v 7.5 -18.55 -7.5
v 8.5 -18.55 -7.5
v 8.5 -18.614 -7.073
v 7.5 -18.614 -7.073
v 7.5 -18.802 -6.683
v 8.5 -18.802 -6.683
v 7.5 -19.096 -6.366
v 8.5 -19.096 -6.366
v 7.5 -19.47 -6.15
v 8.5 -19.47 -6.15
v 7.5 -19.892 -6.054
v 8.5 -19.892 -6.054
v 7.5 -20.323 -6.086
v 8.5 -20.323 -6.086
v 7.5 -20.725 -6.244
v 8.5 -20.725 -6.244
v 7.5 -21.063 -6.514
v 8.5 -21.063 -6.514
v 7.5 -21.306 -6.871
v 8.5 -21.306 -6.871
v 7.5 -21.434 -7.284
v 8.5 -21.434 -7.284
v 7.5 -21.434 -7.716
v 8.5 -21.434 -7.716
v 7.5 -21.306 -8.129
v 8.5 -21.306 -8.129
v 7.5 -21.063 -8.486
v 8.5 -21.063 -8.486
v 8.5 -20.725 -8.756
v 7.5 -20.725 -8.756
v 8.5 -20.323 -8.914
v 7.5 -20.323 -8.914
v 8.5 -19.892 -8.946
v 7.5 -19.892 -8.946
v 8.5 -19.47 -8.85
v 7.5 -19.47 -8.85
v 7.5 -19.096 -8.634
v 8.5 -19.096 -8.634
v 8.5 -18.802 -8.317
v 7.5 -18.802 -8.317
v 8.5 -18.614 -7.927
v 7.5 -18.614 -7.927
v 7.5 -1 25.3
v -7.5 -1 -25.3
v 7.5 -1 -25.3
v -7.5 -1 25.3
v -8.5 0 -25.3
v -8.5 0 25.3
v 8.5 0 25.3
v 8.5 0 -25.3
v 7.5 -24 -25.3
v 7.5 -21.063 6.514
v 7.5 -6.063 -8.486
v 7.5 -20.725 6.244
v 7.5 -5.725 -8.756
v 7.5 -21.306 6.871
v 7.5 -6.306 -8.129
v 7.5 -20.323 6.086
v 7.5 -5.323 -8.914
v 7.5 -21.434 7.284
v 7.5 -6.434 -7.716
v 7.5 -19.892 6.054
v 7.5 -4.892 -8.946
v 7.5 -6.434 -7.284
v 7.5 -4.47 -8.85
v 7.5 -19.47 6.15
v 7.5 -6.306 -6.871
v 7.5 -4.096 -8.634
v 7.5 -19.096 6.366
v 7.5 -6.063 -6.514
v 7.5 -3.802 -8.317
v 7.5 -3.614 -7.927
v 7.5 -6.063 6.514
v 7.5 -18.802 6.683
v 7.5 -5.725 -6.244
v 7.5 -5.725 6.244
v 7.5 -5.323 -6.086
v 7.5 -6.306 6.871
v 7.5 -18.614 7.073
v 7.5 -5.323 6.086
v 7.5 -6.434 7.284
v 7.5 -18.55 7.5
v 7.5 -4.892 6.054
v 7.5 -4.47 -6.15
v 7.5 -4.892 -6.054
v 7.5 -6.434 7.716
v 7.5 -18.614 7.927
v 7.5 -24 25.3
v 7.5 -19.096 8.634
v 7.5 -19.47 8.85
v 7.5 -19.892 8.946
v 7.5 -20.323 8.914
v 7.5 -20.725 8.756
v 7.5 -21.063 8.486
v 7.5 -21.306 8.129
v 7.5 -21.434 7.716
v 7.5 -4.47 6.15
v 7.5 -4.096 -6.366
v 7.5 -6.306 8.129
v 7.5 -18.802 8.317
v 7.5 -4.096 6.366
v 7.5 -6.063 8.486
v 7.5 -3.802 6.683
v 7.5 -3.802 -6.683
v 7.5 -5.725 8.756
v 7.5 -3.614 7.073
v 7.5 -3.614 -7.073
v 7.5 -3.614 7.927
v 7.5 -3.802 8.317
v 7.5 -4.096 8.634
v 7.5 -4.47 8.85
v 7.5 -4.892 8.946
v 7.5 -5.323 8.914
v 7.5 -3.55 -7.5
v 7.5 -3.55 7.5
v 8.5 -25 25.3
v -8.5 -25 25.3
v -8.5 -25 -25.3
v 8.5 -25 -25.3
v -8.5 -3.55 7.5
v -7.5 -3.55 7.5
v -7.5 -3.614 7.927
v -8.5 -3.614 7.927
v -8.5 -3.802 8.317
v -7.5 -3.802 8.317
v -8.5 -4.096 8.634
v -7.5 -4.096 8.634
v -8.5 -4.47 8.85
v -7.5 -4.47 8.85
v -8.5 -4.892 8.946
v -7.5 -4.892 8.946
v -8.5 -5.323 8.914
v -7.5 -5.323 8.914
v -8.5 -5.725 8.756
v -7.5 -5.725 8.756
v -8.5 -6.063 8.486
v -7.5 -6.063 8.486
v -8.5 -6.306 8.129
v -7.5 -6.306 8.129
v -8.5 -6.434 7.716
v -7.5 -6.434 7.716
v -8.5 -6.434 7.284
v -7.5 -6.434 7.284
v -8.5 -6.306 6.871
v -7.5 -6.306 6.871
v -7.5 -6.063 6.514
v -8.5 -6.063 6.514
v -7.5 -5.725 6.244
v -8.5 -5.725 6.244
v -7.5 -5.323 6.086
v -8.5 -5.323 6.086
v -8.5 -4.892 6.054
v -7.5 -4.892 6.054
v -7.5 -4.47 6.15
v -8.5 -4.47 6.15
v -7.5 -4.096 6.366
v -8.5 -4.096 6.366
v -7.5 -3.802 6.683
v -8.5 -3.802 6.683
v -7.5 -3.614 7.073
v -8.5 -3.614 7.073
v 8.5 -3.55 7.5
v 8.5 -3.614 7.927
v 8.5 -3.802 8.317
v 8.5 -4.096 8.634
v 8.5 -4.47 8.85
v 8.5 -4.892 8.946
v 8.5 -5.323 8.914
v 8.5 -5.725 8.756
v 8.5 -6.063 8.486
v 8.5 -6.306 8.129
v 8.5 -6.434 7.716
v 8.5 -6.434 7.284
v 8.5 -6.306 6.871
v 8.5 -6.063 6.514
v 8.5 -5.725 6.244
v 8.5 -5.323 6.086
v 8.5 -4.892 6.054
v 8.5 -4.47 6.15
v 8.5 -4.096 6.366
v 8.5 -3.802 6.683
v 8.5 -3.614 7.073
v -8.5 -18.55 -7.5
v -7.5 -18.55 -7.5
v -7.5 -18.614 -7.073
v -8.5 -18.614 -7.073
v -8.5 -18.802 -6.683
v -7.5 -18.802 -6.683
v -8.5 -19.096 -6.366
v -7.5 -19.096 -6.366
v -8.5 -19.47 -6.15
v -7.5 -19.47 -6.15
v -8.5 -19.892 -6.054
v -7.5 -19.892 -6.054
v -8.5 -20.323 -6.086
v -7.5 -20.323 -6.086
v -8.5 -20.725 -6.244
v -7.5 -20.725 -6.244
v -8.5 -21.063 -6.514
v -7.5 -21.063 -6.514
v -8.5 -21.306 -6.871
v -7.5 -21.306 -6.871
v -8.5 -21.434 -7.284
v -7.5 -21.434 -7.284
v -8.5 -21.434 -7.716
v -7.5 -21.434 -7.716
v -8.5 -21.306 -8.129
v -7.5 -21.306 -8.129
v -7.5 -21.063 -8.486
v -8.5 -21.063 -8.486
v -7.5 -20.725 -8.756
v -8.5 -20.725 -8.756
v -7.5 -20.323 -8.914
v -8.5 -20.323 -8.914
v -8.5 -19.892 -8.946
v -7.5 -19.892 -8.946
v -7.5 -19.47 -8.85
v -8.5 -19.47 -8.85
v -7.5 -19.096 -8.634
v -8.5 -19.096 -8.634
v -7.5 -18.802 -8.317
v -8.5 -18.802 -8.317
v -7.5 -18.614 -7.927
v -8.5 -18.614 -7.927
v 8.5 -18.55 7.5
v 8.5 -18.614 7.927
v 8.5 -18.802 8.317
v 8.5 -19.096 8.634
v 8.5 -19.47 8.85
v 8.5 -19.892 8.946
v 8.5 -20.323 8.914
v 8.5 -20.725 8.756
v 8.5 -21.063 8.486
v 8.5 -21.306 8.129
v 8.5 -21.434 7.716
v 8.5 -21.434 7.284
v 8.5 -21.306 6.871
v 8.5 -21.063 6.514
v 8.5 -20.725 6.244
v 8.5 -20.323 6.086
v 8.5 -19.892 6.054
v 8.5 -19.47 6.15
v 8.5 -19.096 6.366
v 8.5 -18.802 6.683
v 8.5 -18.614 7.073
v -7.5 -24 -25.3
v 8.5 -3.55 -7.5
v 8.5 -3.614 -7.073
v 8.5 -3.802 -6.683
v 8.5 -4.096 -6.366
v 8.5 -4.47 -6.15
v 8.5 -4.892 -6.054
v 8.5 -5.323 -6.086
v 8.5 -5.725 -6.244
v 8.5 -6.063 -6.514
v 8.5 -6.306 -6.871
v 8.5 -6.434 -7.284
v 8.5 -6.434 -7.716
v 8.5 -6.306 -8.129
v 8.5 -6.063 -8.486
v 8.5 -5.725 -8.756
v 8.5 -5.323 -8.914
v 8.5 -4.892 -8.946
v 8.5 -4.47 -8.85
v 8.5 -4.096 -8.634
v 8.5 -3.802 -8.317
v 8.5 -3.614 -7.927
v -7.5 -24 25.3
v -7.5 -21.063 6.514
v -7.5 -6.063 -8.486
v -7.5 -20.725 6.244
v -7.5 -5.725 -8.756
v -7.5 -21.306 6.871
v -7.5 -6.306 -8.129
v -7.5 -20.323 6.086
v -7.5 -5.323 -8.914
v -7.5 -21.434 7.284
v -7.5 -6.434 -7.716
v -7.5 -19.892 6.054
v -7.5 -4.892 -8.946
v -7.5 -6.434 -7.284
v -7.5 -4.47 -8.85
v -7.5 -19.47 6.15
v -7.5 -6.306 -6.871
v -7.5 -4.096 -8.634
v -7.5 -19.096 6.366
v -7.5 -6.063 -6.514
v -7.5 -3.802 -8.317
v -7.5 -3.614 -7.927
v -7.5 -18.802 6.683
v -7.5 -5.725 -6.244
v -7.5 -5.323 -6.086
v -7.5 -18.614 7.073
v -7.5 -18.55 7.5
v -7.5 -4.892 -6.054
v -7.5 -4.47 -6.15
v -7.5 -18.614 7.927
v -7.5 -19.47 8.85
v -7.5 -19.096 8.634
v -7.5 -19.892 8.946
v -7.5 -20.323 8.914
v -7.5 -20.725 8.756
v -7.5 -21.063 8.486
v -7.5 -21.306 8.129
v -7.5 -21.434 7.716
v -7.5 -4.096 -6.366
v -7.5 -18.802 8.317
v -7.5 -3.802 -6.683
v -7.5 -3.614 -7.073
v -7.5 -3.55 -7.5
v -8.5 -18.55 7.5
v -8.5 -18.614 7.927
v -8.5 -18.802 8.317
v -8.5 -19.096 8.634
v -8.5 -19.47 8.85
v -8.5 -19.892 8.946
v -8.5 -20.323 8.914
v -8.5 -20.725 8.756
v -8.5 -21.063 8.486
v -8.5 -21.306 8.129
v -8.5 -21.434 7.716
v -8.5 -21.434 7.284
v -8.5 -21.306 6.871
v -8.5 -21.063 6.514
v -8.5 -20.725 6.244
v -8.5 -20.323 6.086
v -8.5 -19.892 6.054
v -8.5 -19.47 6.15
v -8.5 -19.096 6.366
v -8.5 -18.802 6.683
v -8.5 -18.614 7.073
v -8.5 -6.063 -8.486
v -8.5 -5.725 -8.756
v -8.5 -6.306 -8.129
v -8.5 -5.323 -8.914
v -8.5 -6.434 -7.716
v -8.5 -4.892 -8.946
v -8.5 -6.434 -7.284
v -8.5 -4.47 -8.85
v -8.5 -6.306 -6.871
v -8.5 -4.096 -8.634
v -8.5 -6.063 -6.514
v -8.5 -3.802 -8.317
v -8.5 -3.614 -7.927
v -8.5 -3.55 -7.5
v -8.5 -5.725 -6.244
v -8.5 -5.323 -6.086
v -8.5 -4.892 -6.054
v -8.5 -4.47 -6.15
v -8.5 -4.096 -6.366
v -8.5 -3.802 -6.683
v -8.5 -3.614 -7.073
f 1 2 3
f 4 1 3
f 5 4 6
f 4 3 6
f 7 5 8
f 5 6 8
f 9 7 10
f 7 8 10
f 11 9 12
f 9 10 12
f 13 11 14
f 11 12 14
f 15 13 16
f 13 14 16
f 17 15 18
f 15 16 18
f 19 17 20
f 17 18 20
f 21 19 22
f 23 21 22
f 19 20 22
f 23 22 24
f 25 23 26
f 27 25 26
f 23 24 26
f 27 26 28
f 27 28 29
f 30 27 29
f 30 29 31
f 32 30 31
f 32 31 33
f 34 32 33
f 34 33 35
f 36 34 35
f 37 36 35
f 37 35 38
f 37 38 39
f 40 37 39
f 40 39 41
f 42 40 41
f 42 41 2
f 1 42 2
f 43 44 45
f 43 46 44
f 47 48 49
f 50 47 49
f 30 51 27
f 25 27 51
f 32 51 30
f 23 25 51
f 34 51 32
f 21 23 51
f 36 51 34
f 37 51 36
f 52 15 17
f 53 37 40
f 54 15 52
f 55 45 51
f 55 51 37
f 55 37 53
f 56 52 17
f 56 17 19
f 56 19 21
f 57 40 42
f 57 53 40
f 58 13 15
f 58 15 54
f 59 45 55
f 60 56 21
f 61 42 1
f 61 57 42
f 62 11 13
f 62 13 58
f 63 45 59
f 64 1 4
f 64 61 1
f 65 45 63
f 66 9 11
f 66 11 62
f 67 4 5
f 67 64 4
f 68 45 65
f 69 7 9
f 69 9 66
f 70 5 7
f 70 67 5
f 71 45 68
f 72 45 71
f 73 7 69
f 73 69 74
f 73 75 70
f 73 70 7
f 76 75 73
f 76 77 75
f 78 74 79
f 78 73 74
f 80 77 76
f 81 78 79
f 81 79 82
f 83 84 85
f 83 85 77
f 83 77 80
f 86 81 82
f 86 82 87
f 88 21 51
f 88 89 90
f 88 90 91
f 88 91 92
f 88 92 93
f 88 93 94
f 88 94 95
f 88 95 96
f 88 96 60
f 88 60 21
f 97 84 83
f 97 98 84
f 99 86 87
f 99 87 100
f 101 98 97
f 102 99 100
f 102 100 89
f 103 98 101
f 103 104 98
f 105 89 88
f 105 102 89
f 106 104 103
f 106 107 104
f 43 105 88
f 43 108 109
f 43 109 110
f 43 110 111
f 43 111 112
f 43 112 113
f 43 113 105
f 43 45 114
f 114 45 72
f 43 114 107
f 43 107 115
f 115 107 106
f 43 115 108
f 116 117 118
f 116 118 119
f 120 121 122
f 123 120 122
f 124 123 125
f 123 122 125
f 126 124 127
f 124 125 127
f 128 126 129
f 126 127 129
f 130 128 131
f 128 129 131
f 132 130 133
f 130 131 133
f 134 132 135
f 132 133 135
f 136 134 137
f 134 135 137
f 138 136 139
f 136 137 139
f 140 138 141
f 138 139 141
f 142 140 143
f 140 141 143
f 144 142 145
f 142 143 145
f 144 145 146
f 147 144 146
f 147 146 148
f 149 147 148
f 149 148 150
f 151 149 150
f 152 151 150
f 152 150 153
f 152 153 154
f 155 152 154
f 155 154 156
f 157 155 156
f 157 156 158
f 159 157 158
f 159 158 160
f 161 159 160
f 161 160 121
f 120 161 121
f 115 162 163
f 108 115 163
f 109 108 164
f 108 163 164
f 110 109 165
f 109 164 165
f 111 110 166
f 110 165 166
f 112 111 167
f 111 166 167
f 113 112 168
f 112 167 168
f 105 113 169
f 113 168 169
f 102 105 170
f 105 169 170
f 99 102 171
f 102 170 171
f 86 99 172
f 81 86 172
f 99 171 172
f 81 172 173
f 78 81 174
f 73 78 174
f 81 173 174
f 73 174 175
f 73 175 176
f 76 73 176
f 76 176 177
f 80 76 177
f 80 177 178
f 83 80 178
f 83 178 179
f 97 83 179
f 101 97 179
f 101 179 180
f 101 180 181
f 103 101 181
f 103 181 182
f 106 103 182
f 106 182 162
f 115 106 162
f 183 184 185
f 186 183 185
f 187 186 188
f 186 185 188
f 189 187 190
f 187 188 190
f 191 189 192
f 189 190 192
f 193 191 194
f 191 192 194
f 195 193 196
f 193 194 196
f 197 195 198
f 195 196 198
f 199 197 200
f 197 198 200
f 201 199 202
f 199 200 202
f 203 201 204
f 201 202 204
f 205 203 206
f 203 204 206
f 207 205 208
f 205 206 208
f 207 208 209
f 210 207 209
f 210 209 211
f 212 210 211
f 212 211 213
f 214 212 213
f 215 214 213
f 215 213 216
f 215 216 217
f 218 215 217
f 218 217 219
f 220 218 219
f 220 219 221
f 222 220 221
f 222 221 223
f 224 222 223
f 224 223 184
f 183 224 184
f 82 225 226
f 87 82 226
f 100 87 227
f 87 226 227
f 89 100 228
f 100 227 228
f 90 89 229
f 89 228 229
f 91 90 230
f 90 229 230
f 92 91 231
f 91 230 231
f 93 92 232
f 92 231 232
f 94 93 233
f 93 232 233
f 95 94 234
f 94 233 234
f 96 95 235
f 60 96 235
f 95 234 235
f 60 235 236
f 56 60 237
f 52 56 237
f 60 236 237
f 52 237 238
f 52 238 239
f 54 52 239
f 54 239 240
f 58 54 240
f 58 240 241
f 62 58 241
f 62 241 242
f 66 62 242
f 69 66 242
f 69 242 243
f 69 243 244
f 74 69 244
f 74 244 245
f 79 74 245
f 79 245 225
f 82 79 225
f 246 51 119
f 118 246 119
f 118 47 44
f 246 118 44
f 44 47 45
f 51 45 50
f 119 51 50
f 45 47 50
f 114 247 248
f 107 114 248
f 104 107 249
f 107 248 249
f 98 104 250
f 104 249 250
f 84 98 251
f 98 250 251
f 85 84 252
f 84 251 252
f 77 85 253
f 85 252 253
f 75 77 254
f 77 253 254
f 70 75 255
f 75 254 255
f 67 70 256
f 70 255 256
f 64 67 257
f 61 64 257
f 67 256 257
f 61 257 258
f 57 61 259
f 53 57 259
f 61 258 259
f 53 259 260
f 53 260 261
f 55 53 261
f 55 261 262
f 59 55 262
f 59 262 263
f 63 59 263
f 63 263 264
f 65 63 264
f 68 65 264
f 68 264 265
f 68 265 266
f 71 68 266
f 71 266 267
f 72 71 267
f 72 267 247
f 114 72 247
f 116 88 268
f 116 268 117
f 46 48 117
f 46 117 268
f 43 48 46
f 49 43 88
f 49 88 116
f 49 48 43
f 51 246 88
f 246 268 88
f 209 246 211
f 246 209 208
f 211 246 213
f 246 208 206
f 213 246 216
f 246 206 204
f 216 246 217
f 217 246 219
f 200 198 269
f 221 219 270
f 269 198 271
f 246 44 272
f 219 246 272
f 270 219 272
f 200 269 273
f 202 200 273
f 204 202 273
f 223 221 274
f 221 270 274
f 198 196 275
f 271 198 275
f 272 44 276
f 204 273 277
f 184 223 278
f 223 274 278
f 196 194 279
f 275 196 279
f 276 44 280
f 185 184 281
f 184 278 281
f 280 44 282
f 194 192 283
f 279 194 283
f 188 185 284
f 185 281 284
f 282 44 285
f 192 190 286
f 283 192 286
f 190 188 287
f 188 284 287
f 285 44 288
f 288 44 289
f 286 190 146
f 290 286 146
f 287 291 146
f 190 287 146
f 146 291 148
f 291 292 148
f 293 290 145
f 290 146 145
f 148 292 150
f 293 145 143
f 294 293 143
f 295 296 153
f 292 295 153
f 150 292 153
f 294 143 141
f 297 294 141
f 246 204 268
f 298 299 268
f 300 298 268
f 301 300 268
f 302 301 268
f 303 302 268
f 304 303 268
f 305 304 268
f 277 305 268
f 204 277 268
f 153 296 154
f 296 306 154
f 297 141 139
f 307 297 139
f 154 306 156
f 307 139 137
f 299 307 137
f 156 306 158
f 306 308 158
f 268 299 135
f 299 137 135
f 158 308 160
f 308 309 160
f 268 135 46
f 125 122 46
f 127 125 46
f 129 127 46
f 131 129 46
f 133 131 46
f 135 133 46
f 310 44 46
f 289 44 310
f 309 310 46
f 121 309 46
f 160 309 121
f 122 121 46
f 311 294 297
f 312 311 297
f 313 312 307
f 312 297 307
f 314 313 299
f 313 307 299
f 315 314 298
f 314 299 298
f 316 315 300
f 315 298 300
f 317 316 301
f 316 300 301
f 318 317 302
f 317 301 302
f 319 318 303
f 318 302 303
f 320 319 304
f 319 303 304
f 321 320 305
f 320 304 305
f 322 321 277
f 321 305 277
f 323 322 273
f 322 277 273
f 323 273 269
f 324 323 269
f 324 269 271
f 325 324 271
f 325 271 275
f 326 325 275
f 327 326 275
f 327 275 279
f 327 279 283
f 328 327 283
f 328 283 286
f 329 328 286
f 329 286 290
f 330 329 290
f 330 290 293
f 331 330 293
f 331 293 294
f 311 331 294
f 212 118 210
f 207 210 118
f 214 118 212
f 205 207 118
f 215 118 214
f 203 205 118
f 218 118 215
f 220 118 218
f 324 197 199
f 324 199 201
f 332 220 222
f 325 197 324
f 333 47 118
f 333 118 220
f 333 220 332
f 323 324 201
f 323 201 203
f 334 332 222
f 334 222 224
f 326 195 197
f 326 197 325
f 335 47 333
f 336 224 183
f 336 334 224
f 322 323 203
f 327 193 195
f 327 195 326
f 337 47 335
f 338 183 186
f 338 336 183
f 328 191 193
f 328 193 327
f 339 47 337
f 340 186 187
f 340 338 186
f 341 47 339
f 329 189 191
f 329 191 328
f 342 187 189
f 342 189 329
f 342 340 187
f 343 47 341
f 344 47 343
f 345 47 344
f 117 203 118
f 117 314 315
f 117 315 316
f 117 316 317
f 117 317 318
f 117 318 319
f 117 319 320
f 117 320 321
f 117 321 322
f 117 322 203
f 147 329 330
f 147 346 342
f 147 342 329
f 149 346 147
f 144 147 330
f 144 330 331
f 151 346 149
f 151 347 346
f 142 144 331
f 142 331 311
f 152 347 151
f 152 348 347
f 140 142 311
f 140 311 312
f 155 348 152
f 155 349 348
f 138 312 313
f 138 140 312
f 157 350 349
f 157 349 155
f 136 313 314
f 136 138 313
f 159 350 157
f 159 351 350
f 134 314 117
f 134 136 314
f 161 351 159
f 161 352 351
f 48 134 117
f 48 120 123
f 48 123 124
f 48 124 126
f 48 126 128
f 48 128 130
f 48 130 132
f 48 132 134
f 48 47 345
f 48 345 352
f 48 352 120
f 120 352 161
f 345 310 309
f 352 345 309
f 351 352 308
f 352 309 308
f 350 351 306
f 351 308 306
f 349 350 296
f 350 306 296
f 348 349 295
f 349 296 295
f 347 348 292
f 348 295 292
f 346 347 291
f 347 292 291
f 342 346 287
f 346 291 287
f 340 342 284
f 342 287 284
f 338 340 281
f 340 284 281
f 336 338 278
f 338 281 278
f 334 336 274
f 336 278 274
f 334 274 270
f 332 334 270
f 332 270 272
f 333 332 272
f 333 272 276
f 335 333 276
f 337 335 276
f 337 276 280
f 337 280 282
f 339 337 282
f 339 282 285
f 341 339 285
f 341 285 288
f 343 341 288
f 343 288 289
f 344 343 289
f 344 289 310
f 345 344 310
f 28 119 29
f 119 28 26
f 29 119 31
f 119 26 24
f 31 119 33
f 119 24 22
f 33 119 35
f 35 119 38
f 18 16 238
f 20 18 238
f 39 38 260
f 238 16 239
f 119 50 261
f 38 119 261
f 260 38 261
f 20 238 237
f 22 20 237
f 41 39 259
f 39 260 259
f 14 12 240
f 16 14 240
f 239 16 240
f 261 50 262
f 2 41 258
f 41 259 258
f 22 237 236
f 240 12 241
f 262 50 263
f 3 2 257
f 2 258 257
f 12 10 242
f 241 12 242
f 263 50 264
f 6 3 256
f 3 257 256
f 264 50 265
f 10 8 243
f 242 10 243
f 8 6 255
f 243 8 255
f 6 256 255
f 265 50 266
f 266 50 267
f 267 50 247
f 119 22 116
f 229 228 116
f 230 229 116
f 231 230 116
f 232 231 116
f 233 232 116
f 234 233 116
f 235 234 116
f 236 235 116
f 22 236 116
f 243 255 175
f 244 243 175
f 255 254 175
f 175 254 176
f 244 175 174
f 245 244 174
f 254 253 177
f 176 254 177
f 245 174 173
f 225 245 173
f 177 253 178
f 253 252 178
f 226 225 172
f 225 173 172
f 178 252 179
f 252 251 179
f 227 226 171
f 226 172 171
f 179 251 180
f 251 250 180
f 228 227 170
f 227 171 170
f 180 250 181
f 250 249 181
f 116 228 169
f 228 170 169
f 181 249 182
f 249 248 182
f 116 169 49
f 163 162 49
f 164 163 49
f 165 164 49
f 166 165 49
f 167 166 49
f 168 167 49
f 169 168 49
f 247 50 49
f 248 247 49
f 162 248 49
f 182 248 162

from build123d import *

# Parameters (mm, degrees)
F0_W     = 17
F0_H     = 50.6
F1_DEPTH = 25
F2_T     = -1
F3_R     = 1.45
F4_DEPTH = 25


with BuildPart() as f1:
    # F0 (on Front) → F1 (new body)
    with BuildSketch(Plane.XZ):
        Rectangle(F0_W, F0_H)
    extrude(amount=F1_DEPTH)

    # F2
    f2_openings = [f1.faces().sort_by_distance(p)[0] for p in [
        (0, -12.5, 25.3),
        (0, -12.5, -25.3),
    ]]
    offset(amount=F2_T, openings=f2_openings)

    # F3 (on face) → F4 (cut)
    with BuildSketch(Plane.YZ.offset(8.5)):
        with Locations((-5, 7.5)):
            Circle(F3_R)
        with Locations((-20, 7.5)):
            Circle(F3_R)
        with Locations((-20, -7.5)):
            Circle(F3_R)
        with Locations((-5, -7.5)):
            Circle(F3_R)
    extrude(amount=-F4_DEPTH, mode=Mode.SUBTRACT)


solid = f1.part
